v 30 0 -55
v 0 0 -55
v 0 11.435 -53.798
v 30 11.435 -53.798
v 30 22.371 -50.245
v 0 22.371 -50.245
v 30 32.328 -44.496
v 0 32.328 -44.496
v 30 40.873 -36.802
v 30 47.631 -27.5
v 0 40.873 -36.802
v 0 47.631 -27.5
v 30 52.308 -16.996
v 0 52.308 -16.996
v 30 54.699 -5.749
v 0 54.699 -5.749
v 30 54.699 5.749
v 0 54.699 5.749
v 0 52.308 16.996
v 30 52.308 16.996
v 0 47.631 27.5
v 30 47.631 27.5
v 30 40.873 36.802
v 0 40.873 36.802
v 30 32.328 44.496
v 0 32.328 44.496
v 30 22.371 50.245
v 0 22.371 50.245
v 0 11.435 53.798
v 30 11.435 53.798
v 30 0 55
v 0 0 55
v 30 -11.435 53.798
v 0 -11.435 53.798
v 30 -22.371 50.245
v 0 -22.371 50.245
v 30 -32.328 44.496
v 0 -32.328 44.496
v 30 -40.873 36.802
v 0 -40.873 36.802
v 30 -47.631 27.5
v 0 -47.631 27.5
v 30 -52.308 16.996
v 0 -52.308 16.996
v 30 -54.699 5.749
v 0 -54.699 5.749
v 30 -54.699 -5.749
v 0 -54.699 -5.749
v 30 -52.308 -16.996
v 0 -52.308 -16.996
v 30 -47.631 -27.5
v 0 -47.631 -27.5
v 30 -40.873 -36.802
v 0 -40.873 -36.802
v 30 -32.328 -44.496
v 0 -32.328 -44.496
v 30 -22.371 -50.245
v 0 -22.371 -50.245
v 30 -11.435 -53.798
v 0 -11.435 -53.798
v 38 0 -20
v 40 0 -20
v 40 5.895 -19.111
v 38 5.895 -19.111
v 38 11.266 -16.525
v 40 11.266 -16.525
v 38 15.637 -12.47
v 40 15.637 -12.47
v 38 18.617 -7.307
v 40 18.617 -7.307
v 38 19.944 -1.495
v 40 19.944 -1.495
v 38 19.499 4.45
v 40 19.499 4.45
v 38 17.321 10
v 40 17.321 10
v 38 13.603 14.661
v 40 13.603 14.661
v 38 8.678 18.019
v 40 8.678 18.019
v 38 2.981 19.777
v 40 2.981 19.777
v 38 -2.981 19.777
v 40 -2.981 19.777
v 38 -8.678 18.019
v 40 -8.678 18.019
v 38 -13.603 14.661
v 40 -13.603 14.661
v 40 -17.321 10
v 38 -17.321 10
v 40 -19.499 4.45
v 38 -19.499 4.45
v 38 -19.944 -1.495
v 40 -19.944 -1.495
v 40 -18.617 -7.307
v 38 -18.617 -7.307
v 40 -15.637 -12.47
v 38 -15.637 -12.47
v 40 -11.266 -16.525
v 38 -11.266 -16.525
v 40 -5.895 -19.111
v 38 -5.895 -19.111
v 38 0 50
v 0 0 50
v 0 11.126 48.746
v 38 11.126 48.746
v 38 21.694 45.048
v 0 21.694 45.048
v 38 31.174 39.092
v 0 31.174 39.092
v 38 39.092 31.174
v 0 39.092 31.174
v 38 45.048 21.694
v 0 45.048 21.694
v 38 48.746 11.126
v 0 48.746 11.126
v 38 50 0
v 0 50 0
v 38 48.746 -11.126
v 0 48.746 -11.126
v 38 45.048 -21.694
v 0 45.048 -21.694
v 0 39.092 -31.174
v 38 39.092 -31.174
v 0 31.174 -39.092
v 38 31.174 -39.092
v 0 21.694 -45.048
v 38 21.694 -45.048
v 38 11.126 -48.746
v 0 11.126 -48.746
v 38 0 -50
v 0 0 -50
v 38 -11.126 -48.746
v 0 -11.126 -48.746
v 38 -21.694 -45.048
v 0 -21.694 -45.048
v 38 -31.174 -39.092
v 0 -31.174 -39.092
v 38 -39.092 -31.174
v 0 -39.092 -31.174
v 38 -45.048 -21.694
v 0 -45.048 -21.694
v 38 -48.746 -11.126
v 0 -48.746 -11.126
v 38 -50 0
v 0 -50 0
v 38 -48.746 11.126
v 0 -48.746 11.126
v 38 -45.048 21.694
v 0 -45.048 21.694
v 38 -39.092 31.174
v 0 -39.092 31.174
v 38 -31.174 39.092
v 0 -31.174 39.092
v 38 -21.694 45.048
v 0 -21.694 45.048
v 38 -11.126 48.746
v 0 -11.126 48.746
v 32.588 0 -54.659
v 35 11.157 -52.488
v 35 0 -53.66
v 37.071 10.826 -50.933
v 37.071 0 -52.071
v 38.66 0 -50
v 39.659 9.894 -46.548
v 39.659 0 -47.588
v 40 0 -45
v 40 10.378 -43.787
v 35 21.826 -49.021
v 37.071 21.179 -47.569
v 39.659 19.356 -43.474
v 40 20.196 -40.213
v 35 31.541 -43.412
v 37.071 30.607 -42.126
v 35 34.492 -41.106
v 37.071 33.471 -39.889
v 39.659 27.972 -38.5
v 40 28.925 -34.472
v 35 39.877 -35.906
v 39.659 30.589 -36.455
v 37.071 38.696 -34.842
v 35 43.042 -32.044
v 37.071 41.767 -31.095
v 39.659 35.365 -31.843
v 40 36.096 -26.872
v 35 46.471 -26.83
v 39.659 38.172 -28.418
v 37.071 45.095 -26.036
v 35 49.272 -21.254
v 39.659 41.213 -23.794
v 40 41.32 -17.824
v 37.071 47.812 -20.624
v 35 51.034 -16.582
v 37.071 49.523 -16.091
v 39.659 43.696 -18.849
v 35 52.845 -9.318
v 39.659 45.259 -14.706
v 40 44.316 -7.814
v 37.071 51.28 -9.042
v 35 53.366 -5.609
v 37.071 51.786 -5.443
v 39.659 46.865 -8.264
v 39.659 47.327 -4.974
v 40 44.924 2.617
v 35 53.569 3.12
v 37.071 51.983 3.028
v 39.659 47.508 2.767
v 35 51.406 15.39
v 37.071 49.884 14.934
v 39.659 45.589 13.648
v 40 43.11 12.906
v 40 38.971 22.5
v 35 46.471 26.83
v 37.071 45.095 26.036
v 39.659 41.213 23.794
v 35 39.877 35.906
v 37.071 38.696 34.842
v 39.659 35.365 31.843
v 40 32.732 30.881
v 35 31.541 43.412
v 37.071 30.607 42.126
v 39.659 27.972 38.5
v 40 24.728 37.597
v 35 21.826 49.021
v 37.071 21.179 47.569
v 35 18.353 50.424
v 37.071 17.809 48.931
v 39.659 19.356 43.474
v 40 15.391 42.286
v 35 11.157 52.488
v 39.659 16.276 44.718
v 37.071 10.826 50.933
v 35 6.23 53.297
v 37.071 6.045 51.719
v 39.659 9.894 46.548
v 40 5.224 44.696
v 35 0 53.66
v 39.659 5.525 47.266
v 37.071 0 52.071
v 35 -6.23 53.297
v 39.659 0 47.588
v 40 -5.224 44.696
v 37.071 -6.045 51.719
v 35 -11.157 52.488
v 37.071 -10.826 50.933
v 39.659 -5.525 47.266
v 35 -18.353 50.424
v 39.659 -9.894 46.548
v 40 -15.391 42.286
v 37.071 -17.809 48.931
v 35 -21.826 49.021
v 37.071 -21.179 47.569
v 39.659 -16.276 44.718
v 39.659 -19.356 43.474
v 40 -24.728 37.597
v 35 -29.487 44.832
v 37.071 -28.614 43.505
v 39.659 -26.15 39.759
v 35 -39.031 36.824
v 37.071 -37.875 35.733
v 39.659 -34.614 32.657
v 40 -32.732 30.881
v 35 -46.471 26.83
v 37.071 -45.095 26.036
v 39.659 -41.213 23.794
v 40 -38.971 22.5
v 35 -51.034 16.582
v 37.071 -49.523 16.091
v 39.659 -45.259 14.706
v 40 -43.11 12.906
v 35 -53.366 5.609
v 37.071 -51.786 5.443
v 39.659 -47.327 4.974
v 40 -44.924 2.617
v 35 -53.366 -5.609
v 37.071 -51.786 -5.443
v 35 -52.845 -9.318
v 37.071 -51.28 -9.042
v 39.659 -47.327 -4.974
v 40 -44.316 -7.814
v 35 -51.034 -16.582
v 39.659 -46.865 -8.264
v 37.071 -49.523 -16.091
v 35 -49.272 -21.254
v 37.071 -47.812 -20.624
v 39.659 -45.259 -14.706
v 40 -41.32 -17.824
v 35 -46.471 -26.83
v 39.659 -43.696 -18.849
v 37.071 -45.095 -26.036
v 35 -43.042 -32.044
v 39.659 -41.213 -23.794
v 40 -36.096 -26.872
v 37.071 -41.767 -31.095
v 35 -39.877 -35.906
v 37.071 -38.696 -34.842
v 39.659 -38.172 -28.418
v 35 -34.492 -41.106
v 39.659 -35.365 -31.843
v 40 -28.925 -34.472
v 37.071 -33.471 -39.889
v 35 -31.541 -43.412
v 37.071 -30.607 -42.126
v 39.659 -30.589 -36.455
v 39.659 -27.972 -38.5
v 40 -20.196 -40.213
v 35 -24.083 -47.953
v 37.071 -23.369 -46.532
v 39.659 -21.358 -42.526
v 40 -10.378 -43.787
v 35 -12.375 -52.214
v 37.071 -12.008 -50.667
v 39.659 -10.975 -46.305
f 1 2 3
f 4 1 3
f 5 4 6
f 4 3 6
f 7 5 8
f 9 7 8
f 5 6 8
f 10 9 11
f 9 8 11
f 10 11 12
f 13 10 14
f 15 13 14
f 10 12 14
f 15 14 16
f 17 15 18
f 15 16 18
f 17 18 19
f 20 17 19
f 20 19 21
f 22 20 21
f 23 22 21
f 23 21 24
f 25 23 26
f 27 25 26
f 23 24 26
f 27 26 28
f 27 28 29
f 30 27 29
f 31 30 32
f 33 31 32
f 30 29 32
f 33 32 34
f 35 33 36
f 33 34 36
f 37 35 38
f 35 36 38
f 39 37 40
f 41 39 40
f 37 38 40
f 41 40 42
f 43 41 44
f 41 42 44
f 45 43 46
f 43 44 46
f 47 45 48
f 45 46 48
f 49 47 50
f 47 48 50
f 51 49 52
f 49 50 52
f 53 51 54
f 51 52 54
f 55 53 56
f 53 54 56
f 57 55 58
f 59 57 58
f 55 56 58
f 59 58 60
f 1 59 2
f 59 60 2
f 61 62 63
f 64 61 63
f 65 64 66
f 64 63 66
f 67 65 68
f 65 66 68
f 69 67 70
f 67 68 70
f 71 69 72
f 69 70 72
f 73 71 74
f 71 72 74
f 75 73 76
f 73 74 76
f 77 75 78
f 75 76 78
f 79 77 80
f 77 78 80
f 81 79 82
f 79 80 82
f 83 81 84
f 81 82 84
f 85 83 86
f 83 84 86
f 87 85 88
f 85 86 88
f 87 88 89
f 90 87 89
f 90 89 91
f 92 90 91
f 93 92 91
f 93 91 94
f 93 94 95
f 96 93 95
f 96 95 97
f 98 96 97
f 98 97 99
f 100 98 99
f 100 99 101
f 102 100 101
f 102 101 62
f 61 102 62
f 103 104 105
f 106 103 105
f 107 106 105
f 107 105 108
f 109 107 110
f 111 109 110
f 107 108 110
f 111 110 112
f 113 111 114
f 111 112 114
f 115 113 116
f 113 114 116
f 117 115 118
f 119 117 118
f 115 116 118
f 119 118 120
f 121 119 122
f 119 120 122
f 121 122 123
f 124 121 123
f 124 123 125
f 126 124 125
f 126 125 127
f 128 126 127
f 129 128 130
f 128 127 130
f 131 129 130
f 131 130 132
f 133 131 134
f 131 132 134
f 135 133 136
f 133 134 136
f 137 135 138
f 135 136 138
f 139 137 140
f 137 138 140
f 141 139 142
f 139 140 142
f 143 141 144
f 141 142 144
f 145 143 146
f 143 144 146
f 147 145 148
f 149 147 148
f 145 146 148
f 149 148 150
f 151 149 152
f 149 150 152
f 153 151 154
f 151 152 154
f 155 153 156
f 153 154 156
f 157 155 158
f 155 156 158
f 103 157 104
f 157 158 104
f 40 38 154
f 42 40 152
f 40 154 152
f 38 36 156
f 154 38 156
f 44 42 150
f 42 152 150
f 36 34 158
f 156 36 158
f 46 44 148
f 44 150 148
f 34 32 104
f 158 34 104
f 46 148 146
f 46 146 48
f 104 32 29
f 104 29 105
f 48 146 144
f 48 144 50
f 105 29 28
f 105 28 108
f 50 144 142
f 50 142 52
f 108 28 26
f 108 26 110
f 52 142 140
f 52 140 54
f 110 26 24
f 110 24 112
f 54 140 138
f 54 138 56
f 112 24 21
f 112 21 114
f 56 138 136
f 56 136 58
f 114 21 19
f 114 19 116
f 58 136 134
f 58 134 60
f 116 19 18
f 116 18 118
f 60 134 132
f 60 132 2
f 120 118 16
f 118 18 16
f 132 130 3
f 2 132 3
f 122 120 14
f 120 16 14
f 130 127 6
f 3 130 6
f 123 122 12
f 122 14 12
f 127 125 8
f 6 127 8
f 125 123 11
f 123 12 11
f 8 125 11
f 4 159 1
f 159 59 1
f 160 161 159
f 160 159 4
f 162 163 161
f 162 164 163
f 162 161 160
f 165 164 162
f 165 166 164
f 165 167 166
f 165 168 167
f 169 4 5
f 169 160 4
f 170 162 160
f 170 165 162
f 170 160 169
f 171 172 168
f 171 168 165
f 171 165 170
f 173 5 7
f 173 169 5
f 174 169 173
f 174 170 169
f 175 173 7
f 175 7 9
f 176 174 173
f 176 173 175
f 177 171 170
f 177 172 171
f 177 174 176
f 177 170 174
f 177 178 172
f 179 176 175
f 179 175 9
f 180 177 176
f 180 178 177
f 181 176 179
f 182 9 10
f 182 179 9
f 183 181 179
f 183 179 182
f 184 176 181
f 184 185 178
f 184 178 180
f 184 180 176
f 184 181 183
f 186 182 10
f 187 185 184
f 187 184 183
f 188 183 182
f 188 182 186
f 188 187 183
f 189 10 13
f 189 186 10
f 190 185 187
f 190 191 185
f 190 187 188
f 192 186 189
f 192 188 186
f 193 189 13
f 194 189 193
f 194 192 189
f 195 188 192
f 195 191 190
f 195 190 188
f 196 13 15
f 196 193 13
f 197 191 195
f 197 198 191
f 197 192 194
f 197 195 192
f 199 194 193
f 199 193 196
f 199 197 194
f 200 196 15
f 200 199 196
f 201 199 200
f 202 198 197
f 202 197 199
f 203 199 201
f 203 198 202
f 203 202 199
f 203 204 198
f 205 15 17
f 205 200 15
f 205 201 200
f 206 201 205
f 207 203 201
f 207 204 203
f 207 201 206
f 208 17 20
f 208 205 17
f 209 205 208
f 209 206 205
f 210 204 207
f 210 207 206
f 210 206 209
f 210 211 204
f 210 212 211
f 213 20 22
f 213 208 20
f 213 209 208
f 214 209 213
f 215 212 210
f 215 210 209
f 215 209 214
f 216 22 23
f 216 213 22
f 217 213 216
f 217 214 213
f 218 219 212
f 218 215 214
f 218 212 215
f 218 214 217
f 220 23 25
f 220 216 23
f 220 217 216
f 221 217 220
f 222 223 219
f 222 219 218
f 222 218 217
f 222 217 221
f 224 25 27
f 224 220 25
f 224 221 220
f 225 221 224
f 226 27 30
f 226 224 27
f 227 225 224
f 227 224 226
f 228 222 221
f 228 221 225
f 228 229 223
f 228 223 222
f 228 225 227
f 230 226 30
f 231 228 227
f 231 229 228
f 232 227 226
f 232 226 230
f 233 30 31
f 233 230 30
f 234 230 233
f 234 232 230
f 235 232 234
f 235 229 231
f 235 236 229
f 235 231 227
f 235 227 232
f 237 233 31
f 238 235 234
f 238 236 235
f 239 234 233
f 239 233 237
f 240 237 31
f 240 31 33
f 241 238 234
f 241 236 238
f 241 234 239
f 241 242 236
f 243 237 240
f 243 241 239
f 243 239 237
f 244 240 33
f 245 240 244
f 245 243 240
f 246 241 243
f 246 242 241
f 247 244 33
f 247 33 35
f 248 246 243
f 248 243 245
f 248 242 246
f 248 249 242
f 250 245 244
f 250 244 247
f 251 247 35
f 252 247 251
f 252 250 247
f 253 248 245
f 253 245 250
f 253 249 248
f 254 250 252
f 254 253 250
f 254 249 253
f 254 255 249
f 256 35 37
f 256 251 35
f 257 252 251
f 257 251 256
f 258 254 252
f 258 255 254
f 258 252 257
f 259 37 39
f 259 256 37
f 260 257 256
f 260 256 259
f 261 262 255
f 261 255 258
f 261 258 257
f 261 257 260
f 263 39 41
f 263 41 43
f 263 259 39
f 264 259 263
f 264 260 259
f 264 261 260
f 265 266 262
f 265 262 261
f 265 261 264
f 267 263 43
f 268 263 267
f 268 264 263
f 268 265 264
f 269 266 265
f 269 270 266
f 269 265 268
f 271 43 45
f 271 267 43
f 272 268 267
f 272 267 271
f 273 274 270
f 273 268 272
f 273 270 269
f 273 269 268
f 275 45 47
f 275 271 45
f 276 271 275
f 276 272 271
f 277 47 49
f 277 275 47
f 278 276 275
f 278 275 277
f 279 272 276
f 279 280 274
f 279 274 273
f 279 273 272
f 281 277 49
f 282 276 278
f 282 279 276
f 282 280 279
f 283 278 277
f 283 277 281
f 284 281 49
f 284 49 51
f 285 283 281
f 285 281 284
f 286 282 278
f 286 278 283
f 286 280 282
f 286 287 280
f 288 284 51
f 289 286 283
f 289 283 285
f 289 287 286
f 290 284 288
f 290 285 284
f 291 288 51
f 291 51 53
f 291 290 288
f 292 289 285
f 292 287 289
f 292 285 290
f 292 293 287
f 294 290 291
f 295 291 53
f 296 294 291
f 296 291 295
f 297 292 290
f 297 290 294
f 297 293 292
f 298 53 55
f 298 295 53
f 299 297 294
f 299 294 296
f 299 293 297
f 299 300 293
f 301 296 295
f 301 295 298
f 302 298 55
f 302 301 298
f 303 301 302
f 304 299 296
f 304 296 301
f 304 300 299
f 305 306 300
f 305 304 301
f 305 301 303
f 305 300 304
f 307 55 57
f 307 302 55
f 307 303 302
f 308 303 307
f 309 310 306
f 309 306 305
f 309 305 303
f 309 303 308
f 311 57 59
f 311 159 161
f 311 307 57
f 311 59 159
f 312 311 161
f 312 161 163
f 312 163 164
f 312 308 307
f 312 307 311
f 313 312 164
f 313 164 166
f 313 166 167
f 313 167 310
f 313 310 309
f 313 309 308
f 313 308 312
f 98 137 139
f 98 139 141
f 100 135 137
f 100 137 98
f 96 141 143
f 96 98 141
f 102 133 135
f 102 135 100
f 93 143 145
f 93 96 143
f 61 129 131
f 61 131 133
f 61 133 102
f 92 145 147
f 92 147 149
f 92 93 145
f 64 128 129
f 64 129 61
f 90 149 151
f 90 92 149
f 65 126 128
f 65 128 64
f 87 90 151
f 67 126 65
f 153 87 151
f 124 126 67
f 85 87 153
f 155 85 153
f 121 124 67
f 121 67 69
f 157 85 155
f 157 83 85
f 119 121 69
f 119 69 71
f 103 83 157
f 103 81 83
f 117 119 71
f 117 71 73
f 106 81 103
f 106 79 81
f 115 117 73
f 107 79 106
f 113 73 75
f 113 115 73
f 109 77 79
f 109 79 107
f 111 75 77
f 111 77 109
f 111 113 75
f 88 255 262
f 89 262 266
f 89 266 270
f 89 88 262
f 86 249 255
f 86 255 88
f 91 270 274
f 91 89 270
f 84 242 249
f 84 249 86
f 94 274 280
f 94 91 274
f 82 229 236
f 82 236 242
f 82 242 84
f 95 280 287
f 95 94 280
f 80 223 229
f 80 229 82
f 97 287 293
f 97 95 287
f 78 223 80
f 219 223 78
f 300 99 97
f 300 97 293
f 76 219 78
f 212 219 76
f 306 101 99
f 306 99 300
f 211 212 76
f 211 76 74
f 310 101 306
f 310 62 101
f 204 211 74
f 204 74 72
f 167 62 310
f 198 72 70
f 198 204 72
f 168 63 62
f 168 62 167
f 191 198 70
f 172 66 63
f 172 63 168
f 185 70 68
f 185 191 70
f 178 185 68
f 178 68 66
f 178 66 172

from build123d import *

# Parameters (mm, degrees)
SKETCH1_R           = 55
BOSS_EXTRUDE1_DEPTH = 40
SKETCH2_R           = 50
CUT_EXTRUDE1_DEPTH  = 38
SKETCH3_R           = 20
CUT_EXTRUDE2_DEPTH  = 38
FILLET1_R           = 10


with BuildPart() as part:
    # Sketch1 → Boss-Extrude1 (new body)
    with BuildSketch(Plane(origin=(0, 0, 0), x_dir=(0, 0, -1), z_dir=(1, 0, 0))):
        Circle(SKETCH1_R)
    extrude(amount=BOSS_EXTRUDE1_DEPTH)

    # Sketch2 → Cut-Extrude1 (cut)
    with BuildSketch(Plane.ZY):
        Circle(SKETCH2_R)
    extrude(amount=-CUT_EXTRUDE1_DEPTH, mode=Mode.SUBTRACT)

    # Sketch3 → Cut-Extrude2 (cut)
    with BuildSketch(Plane(origin=(40, 0, 0), x_dir=(0, 0, -1), z_dir=(1, 0, 0))):
        Circle(SKETCH3_R)
    extrude(amount=-CUT_EXTRUDE2_DEPTH, mode=Mode.SUBTRACT)

    # Fillet1
    fillet1_edges = [part.edges().sort_by_distance(p)[0] for p in [
        (40, 0, 55),
    ]]
    fillet(fillet1_edges, radius=FILLET1_R)


solid = part.part
